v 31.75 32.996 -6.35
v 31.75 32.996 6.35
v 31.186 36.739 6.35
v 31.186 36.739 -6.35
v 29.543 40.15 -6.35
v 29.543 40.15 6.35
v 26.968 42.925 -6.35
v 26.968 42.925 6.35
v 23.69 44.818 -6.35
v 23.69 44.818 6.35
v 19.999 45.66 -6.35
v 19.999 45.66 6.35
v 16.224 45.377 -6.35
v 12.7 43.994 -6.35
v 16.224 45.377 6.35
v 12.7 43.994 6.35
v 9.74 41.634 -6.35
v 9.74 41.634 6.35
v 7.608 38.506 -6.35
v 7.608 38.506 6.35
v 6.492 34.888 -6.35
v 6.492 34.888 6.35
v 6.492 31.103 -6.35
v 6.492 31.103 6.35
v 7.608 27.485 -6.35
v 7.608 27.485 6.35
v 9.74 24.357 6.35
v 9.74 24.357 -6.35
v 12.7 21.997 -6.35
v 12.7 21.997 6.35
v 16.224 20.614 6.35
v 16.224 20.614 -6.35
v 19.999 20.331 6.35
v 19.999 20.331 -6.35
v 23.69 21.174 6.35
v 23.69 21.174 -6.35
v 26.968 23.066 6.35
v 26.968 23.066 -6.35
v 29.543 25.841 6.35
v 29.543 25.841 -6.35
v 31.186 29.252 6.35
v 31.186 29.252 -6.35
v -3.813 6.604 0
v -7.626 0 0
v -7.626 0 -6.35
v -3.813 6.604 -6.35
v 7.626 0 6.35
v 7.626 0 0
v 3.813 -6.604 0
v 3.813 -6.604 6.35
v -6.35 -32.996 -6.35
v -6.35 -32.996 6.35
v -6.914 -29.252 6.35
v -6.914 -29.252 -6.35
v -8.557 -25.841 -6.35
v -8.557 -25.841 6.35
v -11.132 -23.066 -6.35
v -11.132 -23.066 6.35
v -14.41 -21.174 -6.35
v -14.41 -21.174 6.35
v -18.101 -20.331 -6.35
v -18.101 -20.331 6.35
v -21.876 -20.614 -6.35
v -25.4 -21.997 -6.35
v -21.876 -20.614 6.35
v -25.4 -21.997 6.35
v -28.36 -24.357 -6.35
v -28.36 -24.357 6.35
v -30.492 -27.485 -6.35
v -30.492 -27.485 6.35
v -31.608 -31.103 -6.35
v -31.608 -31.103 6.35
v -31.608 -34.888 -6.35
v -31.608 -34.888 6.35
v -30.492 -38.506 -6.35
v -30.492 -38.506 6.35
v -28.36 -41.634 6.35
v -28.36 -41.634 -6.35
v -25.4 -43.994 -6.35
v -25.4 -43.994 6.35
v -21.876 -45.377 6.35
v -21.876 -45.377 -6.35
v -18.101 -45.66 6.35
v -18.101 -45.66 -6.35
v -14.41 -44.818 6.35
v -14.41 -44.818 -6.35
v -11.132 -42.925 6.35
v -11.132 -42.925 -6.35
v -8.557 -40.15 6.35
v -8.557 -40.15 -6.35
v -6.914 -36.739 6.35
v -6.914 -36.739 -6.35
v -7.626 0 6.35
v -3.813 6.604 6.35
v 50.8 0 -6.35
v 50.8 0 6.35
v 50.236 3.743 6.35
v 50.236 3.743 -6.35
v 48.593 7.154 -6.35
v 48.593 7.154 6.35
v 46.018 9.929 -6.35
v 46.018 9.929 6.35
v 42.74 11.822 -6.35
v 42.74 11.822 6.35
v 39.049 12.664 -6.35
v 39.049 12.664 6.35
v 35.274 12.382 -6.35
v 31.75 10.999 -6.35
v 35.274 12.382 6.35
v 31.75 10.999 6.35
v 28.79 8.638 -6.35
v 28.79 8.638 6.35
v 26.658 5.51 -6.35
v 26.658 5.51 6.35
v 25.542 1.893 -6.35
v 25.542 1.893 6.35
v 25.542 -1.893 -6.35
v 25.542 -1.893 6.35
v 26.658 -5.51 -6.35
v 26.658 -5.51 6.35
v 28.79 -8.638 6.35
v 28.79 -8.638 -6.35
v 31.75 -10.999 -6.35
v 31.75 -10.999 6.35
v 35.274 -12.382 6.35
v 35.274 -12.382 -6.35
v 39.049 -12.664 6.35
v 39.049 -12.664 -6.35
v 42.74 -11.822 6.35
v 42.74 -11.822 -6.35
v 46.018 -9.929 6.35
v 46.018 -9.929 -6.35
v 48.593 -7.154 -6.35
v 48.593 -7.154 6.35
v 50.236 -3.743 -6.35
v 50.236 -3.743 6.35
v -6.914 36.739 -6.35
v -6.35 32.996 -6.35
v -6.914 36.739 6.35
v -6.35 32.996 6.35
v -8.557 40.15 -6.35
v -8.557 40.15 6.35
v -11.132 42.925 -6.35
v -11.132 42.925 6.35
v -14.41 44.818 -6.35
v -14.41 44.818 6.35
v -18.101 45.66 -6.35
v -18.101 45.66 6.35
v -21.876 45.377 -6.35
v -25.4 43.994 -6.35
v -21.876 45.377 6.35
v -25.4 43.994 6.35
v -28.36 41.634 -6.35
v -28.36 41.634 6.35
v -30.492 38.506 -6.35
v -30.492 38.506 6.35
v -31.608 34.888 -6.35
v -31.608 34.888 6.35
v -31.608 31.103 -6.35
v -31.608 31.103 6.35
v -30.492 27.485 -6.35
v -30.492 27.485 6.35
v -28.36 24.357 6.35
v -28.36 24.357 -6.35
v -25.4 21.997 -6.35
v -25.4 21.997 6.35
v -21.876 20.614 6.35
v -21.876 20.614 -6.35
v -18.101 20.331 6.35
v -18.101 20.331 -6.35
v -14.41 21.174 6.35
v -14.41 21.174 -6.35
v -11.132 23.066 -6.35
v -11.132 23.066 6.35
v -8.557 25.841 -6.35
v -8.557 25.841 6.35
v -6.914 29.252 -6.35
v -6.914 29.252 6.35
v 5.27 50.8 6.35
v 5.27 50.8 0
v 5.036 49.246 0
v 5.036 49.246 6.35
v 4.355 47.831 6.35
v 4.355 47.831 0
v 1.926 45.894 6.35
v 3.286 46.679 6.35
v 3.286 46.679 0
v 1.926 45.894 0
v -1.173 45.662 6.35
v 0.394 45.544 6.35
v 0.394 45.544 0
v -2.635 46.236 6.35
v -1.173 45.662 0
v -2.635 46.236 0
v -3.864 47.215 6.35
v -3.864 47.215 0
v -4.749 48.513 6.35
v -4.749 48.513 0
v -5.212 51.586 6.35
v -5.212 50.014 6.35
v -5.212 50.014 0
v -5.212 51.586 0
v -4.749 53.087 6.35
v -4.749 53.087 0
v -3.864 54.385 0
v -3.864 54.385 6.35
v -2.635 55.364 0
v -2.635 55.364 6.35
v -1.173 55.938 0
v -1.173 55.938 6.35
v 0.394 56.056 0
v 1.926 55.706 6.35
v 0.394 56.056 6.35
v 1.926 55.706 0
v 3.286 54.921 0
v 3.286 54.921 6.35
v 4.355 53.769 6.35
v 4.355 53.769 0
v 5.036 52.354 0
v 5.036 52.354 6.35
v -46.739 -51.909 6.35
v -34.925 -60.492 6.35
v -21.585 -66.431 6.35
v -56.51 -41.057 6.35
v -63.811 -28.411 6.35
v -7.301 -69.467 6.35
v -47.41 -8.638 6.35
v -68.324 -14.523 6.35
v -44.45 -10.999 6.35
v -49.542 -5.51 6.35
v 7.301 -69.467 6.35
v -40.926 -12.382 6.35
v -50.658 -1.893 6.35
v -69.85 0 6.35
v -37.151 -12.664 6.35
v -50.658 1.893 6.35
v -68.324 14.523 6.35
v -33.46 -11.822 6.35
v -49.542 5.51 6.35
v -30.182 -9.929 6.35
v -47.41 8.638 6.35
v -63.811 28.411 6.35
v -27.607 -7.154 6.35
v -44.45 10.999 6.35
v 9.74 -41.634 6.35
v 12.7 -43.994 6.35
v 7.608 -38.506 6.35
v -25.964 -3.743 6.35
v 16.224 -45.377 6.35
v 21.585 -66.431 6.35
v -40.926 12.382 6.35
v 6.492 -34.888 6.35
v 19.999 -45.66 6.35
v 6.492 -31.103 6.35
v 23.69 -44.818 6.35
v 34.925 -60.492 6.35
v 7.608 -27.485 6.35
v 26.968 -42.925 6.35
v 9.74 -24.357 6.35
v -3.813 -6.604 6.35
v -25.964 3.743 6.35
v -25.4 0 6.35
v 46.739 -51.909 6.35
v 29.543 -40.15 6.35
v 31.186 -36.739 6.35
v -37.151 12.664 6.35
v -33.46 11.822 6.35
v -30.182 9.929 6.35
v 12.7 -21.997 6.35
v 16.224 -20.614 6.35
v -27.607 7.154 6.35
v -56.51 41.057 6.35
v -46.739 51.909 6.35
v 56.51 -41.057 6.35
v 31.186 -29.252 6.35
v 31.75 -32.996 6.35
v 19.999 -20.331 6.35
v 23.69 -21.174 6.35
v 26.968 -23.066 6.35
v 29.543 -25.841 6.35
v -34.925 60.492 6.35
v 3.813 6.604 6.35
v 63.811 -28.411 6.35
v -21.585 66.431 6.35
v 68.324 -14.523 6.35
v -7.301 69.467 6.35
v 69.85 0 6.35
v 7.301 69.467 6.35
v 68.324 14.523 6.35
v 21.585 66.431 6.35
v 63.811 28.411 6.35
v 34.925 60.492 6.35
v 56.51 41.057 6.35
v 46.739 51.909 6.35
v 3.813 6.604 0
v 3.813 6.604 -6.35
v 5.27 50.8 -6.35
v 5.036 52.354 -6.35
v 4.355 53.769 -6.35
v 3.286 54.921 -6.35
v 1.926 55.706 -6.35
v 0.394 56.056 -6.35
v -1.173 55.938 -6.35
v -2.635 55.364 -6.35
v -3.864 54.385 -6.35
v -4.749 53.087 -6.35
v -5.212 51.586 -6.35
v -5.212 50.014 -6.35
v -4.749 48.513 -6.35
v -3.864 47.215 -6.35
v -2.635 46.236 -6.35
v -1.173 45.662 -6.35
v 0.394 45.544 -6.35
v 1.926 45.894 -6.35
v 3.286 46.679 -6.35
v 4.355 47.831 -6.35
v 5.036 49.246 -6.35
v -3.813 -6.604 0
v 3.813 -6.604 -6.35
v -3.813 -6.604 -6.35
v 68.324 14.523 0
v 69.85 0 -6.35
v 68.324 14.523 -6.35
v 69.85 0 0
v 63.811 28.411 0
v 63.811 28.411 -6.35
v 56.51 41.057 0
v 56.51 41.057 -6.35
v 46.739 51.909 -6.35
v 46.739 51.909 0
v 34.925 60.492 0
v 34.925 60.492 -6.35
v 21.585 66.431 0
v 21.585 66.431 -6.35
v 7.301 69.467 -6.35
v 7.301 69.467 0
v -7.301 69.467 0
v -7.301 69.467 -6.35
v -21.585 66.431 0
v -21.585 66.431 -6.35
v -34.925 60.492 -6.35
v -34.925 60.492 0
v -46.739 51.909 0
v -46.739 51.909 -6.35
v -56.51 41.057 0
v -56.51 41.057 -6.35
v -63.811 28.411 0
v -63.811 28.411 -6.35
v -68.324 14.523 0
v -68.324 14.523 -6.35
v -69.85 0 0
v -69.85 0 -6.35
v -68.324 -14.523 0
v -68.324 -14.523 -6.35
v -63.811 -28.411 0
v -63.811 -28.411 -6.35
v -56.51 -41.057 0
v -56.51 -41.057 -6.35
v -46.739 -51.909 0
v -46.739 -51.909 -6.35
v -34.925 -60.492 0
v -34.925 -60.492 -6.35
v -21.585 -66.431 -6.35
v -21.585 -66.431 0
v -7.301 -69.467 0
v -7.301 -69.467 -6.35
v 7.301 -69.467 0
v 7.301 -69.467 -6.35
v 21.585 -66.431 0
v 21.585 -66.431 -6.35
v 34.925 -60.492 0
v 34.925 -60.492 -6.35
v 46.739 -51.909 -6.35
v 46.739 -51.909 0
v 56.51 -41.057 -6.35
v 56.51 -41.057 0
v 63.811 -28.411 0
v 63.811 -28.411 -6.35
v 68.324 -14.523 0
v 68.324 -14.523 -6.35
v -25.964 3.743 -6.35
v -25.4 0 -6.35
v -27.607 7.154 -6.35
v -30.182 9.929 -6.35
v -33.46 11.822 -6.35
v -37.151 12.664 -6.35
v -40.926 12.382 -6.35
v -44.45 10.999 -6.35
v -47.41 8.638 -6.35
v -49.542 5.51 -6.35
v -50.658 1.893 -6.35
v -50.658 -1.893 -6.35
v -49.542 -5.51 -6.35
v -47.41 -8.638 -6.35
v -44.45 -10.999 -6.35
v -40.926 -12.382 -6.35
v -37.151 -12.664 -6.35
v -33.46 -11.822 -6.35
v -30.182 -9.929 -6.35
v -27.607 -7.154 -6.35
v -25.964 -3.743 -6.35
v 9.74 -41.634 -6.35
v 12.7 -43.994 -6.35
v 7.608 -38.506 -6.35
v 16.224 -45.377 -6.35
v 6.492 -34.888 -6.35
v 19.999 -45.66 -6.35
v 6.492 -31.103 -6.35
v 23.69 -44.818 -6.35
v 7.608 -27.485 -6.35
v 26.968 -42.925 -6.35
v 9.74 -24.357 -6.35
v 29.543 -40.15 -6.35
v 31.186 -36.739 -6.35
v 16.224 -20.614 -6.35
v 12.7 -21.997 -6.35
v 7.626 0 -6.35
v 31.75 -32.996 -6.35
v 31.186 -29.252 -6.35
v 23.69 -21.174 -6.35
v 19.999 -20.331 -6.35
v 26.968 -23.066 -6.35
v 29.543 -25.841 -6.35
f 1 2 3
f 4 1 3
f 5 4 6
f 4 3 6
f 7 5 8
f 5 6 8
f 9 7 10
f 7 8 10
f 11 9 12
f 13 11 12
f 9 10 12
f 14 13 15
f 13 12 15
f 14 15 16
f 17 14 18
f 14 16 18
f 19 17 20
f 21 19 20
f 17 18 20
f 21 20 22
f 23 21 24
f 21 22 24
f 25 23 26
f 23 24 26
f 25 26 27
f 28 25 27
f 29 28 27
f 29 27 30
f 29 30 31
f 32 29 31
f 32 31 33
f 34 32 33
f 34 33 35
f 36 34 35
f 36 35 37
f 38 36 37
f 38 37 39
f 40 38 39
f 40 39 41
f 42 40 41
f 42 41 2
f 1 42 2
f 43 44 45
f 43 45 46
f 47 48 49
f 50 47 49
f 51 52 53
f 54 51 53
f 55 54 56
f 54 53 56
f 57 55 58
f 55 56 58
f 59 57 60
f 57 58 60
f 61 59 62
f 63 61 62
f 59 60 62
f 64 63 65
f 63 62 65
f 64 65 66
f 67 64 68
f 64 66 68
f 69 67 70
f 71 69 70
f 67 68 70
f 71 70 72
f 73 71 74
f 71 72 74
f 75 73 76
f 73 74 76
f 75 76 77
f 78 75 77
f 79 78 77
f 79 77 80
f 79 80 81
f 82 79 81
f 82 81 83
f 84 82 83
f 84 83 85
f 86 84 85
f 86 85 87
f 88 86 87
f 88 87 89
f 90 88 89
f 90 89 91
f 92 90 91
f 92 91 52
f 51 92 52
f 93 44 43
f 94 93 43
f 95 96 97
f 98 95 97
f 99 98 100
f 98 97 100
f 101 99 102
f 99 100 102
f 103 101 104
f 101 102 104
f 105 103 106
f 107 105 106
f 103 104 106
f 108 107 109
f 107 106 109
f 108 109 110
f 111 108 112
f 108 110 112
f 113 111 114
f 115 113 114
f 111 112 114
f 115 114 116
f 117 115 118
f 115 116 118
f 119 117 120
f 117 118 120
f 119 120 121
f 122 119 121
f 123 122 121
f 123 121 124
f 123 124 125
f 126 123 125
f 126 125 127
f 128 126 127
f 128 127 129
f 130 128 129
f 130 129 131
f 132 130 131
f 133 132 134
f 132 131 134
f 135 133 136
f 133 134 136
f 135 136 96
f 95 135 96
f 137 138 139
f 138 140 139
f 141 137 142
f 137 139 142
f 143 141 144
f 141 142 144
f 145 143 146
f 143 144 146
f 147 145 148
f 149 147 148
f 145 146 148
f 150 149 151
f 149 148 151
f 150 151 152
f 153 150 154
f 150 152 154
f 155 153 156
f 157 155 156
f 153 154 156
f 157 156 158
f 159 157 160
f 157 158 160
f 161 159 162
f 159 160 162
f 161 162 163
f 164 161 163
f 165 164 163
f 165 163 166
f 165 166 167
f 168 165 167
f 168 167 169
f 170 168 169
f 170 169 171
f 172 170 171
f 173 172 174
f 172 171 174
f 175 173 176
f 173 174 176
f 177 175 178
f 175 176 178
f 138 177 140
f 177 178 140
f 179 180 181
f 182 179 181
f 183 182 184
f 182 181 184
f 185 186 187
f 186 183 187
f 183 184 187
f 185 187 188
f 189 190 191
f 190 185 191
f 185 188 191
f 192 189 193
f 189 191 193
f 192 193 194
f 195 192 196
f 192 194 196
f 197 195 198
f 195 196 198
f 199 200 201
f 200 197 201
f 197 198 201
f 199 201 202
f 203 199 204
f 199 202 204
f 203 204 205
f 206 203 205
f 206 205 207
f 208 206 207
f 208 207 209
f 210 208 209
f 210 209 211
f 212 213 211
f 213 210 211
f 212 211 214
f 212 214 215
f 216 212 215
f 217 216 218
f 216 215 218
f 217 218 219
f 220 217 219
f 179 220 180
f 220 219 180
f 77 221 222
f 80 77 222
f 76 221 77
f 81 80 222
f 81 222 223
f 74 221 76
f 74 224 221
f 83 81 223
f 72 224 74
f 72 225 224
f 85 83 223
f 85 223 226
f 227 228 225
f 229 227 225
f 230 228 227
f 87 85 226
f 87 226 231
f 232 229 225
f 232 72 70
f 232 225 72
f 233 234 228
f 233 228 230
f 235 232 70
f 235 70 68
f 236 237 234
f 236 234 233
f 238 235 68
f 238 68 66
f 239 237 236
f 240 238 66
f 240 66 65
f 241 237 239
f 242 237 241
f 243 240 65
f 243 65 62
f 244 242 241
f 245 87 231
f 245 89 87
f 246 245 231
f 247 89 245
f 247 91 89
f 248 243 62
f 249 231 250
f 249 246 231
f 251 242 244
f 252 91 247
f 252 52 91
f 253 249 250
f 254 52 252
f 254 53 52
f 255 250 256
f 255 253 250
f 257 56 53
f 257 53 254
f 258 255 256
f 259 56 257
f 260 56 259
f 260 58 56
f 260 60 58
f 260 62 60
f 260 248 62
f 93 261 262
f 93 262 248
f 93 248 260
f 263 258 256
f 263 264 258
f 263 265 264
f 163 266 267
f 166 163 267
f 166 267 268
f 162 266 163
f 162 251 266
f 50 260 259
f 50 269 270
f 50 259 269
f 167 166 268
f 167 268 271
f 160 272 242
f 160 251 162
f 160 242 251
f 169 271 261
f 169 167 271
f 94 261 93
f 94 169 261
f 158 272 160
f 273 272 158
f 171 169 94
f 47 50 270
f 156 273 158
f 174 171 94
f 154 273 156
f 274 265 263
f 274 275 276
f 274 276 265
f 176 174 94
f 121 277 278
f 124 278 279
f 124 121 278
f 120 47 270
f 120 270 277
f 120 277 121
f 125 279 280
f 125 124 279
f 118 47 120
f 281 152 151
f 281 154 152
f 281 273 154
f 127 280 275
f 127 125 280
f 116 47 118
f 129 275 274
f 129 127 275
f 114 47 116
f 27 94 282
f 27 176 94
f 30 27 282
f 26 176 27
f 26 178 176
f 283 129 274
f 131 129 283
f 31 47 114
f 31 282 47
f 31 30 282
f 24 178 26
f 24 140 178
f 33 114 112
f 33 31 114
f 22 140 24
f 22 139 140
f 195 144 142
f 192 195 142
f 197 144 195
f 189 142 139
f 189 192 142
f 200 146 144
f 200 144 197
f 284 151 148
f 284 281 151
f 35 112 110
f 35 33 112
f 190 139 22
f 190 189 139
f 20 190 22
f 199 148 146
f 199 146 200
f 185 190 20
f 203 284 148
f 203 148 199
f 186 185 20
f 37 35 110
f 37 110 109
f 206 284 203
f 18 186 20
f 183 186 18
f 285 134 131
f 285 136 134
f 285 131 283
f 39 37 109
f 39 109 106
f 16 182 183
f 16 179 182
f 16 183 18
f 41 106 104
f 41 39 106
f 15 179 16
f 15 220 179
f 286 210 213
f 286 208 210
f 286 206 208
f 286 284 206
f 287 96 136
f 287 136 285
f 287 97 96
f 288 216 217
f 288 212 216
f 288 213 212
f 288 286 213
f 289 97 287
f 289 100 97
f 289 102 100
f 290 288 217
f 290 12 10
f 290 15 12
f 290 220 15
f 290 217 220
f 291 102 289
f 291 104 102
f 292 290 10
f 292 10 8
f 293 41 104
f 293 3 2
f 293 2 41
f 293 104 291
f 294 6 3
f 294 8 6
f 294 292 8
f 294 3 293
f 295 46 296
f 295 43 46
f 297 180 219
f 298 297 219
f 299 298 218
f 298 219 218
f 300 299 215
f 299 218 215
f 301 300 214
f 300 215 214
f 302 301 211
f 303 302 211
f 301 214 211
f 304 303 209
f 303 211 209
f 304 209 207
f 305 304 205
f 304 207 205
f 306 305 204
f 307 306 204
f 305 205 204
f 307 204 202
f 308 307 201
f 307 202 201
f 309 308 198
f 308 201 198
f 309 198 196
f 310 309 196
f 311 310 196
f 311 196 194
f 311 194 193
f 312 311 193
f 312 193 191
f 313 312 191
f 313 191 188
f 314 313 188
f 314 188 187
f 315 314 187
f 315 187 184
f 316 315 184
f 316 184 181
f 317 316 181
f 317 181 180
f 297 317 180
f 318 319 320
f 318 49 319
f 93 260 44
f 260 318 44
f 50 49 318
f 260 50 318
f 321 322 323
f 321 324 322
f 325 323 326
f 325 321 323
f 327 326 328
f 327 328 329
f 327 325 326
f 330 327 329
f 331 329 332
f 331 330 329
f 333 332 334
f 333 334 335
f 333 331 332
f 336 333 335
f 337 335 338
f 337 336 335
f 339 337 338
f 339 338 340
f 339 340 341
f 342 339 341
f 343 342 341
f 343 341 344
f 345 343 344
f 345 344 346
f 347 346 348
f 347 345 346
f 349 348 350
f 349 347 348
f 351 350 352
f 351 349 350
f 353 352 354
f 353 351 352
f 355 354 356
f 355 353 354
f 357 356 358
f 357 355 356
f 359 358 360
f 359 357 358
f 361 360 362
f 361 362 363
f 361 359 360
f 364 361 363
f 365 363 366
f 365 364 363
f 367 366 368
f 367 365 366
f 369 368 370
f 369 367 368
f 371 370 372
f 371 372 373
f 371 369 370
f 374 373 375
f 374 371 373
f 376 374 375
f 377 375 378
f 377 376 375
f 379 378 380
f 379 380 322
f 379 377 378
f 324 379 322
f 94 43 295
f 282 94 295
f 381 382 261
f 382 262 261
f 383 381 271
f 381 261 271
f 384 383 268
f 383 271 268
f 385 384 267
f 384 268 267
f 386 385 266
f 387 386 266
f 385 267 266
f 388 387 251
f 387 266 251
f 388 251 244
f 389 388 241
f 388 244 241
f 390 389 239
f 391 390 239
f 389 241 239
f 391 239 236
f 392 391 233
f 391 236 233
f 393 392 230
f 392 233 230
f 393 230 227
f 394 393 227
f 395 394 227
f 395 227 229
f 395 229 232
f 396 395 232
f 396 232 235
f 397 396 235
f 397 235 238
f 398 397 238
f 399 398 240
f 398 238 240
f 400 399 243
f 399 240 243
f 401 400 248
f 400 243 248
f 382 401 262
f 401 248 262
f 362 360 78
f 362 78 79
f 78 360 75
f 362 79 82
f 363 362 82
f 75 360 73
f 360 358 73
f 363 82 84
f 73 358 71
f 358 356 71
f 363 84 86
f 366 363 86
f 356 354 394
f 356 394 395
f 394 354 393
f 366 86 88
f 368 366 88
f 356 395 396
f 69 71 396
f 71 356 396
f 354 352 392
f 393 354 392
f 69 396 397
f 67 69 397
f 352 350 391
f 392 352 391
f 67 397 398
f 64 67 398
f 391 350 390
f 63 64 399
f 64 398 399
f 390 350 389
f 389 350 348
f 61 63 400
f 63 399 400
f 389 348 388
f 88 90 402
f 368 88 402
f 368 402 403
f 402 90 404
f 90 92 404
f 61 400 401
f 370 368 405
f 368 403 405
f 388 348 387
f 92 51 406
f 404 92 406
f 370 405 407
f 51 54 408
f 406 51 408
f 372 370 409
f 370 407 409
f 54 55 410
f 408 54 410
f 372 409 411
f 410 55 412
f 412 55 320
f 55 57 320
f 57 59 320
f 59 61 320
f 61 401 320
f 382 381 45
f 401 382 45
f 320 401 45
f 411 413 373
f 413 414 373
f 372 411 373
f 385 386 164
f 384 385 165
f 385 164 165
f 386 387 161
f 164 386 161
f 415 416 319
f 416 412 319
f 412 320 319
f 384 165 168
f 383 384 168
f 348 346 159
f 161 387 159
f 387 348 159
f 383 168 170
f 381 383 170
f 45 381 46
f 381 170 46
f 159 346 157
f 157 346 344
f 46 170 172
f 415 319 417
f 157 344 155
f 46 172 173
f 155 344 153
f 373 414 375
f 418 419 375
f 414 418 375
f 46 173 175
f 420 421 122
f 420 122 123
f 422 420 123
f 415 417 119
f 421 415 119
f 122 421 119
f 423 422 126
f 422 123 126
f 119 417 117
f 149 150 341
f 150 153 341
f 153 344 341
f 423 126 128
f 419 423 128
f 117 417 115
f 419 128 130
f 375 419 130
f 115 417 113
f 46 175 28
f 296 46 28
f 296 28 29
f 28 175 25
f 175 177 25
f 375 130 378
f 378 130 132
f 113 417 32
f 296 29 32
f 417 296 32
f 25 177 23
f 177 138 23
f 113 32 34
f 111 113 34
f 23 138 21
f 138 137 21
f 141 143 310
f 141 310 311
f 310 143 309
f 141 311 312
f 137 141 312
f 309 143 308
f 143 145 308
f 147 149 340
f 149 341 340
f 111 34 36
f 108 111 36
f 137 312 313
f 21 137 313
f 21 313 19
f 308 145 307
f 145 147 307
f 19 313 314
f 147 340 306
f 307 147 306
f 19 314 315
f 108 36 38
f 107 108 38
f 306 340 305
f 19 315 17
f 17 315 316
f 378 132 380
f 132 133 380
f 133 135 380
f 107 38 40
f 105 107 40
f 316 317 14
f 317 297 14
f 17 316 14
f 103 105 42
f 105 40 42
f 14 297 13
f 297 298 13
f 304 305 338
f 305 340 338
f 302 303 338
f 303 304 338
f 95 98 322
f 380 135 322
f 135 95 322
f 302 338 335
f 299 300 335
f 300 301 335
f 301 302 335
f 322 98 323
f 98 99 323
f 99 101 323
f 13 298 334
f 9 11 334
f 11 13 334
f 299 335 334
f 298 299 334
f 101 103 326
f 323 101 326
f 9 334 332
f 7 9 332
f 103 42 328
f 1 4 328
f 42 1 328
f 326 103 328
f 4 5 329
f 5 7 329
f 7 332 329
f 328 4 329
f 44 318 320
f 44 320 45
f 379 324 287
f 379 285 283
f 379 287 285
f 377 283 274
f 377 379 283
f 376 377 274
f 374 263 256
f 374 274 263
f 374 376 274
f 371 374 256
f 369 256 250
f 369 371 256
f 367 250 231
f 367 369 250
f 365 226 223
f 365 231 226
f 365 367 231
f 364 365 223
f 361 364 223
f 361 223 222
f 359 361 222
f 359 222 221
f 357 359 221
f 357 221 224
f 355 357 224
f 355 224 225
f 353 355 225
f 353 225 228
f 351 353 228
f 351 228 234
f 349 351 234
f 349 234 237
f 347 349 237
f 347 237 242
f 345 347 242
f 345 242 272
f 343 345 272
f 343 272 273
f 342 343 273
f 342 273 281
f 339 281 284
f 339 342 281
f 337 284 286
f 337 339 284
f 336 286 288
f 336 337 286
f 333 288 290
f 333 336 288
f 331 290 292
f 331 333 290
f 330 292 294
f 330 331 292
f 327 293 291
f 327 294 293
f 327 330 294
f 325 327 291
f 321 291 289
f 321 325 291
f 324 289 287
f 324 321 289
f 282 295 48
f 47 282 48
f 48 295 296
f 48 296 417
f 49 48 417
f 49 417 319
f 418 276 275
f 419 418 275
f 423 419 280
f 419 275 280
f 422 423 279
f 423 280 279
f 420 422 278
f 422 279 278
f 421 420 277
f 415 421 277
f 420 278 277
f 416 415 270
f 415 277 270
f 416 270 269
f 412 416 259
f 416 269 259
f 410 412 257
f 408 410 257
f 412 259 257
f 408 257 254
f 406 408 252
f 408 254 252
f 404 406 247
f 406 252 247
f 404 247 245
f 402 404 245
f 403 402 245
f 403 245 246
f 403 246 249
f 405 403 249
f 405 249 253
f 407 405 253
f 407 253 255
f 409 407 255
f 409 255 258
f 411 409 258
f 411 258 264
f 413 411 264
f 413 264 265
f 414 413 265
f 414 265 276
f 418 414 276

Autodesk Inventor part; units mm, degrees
ref_plane "YZ Plane" through (0, 0, 0) normal (1, 0, 0) x (0, 1, 0)
ref_plane "XZ Plane" through (0, 0, 0) normal (0, 1, 0) x (-1, 0, 0)
ref_plane "XY Plane" through (0, 0, 0) normal (0, 0, 1) x (1, 0, 0)
sketch "Sketch1" plane through (0, 0, 0) normal (0, 0, 1) x (1, 0, 0)
  circle A0 centre (0, 0) radius 69.85
  line L0 (7.6256, 0) -> (3.8128, -6.604)
  line L1 (3.8128, -6.604) -> (-3.8128, -6.604)
  line L2 (-3.8128, -6.604) -> (-7.6256, 0)
  line L3 (-7.6256, 0) -> (-3.8128, 6.604)
  line L4 (-3.8128, 6.604) -> (3.8128, 6.604)
  line L5 (3.8128, 6.604) -> (7.6256, 0)
  circle A1 centre (0, 50.8) radius 5.2705
  dimension "d0" = 139.7
  dimension "d1" = 13.208
  dimension "d2" = 10.541
  dimension "d5" = 50.8
extrude "Extrusion1" add sketch "Sketch1" along normal mid plane 12.7
sketch "Sketch2" plane through (0, 0, 6.35) normal (0, 0, 1) x (1, 0, 0)
  circle A0 centre (-38.1, 0) radius 12.7
  circle A1 centre (-19.05, -32.9956) radius 12.7
  circle A2 centre (19.05, -32.9956) radius 12.7
  circle A3 centre (38.1, 0) radius 12.7
  circle A4 centre (19.05, 32.9956) radius 12.7
  circle A5 centre (-19.05, 32.9956) radius 12.7
  point P0 (0, 0)
  dimension "d6" = 25.4
  dimension "d7" = 38.1
  dimension "d10" = 360
extrude "Extrusion2" cut sketch "Sketch2" against normal through all
properties part number "driveForPiston-4-in"
